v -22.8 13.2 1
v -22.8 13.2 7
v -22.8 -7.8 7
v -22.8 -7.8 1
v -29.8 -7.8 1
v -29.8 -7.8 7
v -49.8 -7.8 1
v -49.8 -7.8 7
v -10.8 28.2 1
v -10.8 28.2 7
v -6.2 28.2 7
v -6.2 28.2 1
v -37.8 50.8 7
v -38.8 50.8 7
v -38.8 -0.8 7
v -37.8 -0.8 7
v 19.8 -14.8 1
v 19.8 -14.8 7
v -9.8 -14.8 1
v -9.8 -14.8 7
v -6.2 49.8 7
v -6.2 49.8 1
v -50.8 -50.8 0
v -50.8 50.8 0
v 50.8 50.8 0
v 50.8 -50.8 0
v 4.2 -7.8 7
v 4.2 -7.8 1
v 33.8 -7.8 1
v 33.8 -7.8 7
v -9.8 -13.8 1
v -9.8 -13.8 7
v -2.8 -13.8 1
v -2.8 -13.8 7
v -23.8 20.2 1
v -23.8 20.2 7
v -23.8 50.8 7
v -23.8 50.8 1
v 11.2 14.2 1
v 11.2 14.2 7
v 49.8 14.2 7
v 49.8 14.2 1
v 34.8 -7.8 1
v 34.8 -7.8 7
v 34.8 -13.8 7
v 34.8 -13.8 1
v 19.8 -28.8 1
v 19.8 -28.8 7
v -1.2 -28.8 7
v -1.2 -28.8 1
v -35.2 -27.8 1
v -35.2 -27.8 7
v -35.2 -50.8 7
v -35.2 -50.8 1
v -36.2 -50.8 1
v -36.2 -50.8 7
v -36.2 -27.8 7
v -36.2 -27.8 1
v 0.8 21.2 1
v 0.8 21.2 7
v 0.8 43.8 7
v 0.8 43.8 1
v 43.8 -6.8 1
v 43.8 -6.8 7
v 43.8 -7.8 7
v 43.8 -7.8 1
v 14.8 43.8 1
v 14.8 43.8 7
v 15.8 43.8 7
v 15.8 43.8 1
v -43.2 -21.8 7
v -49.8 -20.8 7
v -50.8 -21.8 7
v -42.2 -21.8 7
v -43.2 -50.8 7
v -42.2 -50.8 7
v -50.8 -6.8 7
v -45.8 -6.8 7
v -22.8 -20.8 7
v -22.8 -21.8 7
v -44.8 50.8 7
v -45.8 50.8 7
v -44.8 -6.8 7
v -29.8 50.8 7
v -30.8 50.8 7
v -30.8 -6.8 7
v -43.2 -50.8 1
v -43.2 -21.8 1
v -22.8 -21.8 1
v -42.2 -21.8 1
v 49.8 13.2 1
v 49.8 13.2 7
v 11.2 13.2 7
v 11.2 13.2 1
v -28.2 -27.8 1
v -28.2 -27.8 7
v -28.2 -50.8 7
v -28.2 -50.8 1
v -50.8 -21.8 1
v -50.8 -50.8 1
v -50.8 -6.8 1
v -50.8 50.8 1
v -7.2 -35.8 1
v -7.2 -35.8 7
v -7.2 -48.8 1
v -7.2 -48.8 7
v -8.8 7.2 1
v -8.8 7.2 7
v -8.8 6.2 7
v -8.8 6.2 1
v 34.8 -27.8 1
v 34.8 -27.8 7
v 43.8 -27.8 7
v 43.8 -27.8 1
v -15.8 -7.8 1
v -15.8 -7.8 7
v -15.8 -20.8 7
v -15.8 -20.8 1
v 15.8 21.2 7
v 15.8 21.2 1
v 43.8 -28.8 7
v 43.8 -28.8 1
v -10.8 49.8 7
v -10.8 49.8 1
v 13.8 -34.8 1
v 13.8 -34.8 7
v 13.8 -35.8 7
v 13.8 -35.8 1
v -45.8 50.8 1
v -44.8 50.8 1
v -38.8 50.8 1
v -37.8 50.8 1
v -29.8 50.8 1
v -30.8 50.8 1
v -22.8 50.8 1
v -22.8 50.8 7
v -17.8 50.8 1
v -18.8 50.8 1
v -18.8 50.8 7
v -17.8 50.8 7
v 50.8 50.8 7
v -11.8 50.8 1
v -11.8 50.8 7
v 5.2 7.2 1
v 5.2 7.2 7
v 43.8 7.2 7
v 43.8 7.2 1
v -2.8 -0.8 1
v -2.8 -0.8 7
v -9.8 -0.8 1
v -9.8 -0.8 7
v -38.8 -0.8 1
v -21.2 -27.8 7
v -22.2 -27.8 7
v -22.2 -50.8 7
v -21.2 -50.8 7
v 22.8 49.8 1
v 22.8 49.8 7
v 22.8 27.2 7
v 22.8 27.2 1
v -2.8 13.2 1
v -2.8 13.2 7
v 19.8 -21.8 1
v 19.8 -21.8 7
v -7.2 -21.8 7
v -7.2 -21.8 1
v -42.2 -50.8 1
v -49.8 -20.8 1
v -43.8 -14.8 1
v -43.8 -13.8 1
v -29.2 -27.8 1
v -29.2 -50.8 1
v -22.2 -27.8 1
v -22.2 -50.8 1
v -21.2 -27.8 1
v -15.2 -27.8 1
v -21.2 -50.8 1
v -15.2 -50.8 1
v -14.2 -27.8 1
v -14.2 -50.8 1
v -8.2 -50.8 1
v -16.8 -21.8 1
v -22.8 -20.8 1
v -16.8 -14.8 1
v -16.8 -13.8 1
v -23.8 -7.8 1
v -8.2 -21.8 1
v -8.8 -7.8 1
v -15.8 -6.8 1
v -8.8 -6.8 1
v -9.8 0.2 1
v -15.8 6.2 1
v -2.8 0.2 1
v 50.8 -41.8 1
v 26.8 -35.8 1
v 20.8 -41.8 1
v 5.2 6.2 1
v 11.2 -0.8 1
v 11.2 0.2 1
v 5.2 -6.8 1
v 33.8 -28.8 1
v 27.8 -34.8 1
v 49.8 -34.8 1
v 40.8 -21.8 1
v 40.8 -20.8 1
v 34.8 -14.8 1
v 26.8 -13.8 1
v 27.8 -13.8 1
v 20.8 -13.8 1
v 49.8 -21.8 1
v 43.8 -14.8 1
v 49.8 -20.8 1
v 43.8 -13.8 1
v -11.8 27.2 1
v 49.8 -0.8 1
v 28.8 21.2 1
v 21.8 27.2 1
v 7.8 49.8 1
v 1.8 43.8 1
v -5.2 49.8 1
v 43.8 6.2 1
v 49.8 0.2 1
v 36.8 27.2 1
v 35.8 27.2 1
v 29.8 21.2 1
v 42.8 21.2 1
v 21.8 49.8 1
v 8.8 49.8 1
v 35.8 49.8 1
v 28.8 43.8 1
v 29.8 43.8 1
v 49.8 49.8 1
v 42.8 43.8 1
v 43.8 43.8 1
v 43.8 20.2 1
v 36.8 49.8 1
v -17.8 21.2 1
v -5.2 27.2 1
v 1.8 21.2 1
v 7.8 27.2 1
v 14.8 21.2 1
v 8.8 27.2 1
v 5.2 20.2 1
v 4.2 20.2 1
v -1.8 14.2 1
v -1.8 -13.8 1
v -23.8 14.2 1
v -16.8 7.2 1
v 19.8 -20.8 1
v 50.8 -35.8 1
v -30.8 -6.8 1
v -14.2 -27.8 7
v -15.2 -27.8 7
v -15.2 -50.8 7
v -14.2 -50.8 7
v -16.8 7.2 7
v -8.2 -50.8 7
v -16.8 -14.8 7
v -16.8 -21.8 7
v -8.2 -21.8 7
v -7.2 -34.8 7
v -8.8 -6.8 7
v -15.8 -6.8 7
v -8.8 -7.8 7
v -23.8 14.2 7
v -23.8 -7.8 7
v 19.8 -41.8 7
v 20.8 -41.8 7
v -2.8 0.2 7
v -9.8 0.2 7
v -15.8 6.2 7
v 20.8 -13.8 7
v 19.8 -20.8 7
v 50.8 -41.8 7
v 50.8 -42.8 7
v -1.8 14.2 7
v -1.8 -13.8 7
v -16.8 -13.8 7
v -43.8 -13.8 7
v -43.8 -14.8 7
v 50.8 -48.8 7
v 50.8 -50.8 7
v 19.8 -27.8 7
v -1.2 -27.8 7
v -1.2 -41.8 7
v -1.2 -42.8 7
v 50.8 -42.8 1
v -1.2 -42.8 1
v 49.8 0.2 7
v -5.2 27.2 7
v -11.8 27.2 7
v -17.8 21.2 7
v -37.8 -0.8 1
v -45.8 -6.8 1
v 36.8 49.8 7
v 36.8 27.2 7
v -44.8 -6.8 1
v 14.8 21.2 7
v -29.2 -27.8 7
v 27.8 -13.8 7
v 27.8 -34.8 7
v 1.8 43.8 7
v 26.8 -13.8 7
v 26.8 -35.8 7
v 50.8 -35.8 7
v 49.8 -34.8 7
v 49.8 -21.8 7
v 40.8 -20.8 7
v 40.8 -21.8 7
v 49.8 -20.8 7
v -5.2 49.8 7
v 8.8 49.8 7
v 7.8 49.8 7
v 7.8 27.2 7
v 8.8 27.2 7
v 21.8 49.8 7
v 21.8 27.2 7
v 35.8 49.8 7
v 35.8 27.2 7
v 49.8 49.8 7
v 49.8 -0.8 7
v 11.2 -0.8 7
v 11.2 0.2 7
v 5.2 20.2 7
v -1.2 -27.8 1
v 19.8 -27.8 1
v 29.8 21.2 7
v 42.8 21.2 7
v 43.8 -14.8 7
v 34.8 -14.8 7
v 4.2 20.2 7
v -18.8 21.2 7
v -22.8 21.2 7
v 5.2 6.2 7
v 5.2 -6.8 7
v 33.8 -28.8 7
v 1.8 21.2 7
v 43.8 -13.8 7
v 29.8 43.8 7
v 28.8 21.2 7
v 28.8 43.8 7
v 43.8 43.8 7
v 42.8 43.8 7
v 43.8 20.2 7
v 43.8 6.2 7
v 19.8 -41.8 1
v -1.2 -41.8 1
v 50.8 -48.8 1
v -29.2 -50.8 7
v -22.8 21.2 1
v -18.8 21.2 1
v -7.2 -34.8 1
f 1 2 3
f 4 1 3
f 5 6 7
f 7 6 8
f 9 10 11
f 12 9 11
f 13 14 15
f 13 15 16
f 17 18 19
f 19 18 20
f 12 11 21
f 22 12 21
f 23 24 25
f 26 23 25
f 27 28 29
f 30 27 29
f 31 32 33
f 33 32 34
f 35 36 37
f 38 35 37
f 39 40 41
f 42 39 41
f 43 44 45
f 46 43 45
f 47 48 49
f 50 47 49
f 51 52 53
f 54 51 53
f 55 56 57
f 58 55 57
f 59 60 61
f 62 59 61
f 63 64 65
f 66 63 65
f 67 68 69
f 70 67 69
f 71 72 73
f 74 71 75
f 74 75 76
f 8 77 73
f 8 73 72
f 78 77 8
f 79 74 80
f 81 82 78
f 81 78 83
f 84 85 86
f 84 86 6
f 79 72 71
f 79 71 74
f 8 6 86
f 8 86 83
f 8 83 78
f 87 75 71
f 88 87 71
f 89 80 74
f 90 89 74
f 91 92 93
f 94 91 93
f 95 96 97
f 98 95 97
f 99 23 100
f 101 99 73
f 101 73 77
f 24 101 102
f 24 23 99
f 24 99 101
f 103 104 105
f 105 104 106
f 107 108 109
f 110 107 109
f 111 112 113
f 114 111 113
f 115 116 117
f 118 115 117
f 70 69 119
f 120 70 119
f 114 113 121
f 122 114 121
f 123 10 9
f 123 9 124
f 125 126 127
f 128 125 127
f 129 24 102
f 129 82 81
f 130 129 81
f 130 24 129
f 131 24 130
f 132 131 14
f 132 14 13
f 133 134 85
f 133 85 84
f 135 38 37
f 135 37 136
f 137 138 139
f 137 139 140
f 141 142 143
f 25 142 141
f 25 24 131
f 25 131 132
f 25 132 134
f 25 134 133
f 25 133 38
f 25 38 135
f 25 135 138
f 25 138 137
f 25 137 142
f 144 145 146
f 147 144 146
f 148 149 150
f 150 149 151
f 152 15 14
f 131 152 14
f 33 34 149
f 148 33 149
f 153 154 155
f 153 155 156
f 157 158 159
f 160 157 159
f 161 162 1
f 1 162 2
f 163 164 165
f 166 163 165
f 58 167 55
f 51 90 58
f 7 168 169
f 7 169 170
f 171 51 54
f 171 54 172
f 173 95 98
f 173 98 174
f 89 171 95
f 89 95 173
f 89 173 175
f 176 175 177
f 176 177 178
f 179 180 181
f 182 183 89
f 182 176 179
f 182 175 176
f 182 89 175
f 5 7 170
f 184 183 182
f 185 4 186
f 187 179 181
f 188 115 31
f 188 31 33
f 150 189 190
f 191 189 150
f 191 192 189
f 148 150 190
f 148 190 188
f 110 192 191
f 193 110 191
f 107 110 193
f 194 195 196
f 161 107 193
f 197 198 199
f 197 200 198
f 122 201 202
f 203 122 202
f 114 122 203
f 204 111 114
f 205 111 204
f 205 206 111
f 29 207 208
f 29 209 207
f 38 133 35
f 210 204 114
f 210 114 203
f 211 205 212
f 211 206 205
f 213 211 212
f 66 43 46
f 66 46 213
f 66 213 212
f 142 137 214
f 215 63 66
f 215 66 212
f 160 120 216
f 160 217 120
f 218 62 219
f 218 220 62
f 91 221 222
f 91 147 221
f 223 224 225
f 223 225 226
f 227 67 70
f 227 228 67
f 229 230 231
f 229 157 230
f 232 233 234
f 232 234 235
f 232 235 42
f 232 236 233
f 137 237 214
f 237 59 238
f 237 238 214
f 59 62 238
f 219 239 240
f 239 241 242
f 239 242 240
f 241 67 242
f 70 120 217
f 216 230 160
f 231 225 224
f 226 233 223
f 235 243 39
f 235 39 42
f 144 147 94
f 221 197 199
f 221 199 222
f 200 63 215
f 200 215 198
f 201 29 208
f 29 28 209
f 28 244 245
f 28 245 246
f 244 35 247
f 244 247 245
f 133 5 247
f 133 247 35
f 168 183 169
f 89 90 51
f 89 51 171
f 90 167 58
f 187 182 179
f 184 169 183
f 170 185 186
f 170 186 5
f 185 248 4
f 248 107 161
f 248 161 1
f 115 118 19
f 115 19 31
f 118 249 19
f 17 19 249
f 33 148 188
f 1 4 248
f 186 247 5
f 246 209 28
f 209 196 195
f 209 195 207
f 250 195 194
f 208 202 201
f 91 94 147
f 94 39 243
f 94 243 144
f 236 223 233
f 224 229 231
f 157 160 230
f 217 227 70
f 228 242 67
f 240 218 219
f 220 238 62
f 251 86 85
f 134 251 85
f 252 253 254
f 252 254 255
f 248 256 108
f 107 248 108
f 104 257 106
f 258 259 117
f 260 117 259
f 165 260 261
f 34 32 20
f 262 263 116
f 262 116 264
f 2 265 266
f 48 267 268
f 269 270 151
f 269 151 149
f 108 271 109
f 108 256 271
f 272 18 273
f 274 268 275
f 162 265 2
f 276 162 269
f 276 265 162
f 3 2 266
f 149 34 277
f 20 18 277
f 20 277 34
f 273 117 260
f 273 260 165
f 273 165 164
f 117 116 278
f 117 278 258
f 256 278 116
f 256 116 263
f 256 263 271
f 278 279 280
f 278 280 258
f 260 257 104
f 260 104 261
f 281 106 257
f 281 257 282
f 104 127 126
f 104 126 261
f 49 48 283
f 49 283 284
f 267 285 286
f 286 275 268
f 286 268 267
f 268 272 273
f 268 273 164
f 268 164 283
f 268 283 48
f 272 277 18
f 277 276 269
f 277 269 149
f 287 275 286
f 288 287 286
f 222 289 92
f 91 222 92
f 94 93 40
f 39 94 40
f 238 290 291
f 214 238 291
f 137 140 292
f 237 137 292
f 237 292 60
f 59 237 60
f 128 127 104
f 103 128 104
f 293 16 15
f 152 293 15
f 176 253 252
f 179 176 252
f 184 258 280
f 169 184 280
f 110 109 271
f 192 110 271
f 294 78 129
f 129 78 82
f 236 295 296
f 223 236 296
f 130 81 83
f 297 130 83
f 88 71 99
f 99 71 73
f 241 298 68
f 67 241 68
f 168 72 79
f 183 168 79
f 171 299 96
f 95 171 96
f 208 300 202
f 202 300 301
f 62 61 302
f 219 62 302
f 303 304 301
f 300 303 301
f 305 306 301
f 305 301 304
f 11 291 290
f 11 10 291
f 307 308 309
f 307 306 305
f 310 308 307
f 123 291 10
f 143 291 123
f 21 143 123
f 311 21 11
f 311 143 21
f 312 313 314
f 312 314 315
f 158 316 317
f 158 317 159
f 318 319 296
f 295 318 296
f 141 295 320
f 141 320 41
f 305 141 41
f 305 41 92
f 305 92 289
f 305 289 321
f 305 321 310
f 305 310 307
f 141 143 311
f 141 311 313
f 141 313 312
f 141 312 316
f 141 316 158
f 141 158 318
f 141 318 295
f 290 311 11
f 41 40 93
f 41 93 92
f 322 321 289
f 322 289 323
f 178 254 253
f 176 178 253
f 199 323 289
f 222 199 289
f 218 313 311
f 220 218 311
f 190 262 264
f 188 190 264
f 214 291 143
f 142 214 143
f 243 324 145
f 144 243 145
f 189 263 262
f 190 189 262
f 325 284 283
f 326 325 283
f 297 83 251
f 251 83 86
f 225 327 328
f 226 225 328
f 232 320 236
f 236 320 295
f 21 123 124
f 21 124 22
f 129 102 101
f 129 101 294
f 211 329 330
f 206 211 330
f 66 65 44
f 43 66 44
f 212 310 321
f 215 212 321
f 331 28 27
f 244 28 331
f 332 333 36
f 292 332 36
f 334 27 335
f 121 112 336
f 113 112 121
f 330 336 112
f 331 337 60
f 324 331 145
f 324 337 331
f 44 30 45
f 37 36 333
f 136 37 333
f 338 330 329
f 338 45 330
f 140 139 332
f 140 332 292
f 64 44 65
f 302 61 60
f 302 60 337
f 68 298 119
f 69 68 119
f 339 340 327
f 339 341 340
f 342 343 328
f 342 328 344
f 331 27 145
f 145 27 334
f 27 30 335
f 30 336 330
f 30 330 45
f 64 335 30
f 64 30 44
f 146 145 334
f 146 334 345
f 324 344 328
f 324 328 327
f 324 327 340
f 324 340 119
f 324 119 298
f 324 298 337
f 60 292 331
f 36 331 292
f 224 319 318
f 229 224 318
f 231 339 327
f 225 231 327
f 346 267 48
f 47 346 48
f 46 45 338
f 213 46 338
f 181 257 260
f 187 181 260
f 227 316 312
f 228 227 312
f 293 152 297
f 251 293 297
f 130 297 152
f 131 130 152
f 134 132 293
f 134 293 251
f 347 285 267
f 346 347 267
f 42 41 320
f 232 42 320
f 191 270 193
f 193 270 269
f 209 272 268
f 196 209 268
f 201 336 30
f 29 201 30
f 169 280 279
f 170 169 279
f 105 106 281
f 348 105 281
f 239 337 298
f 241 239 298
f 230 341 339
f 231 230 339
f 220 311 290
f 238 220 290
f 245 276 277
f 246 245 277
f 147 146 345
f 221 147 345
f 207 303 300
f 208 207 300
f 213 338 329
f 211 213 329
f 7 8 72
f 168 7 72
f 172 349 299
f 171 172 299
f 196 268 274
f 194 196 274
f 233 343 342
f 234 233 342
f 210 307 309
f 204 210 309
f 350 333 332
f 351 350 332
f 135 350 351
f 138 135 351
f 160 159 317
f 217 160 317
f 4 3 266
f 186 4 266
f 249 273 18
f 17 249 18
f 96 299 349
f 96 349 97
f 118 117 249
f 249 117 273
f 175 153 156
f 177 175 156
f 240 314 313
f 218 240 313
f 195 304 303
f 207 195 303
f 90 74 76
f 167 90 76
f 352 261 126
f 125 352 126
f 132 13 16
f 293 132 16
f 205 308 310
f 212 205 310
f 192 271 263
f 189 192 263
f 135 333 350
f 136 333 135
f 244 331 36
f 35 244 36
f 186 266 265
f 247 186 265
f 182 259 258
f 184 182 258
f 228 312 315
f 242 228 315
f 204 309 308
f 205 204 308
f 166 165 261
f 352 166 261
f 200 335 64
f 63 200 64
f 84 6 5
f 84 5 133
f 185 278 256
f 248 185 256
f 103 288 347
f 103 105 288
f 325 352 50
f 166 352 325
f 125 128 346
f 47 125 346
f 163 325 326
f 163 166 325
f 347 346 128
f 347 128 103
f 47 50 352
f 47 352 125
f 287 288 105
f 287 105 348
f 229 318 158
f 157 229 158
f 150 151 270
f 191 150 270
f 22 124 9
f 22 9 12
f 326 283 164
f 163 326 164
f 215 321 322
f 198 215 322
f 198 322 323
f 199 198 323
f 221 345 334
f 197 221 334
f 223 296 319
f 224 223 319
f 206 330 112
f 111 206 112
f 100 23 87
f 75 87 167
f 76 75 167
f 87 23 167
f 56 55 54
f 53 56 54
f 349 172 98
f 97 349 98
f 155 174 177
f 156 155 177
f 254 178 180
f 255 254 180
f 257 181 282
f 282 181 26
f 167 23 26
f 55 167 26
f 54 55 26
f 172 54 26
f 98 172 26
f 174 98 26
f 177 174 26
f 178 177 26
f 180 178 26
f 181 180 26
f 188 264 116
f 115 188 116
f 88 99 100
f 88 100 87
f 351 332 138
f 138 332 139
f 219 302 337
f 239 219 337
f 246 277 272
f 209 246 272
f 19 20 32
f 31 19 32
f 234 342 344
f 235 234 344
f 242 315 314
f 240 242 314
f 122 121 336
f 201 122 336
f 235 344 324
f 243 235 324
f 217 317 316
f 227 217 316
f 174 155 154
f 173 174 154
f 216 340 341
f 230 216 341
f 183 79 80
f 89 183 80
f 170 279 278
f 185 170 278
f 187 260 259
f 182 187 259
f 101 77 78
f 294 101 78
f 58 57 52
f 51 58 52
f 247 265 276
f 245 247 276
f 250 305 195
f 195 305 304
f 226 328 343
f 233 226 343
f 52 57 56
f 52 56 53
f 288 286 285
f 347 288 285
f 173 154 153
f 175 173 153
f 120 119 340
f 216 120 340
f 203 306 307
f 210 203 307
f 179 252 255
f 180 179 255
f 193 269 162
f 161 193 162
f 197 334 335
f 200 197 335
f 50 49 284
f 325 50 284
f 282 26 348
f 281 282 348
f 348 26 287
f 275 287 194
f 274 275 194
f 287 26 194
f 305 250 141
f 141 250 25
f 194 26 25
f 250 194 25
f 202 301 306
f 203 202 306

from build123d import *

# Parameters (mm, degrees)
F0_W      = 101.6
F0_H      = 101.6
F1_DEPTH  = 7
F3_DEPTH  = 6
F4_W      = 5
F4_H      = 57.6000098
F5_DEPTH  = 6
F6_W      = 6
F6_H      = 29.5999916
F6_W_2    = 4
F6_W_3    = 4.6
F6_H_2    = 21.5999916
F7_DEPTH  = 6
F9_DEPTH  = 6
F11_DEPTH = 6
F12_W     = 22.6
F12_H     = 1
F13_DEPTH = 6
F15_DEPTH = 6


with BuildPart() as f1:
    # F0 (on Top) → F1 (new body)
    with BuildSketch(Plane.XY):
        Rectangle(F0_W, F0_H)
    extrude(amount=F1_DEPTH)

    # F2 (on face) → F3 (cut)
    with BuildSketch(Plane.XY.offset(7)):
        Polygon((-1.2, -42.8), (-1.2, -41.8), (19.8, -41.8), (19.8, -28.8), (-1.2, -28.8), (-1.2, -27.8), (19.8, -27.8), (19.8, -21.8), (-7.2, -21.8), (-7.2, -34.8), (13.8, -34.8), (13.8, -35.8), (-7.2, -35.8), (-7.2, -48.8), (50.8, -48.8), (50.8, -42.8), align=None)
    extrude(amount=-F3_DEPTH, mode=Mode.SUBTRACT)

    # F4 (on face) → F5 (cut)
    with BuildSketch(Plane.XY.offset(7)):
        with Locations((-48.3, 21.9999951)):
            Rectangle(F4_W, F4_H)
        Polygon((-44.8, 50.8), (-44.8, -6.8000098), (-30.8, -6.8000098), (-30.8, 50.8), (-37.8, 50.8), (-37.8, -0.8000098), (-38.8, -0.8000098), (-38.8, 50.8), align=None)
    extrude(amount=-F5_DEPTH, mode=Mode.SUBTRACT)

    # F6 (on face) → F7 (cut)
    with BuildSketch(Plane.XY.offset(7)):
        with Locations((-26.8, 36.0000042)):
            Rectangle(F6_W, F6_H)
        with Locations((-20.8, 36.0000042)):
            Rectangle(F6_W_2, F6_H)
        Polygon((-17.8, 50.8), (-17.8, 21.2000084), (0.8, 21.2000084), (0.8, 43.8), (1.8, 43.8), (1.8, 21.2000084), (14.8, 21.2000084), (14.8, 43.8), (15.8, 43.8), (15.8, 21.2000084), (28.8, 21.2000084), (28.8, 43.8), (29.8, 43.8), (29.8, 21.2000084), (42.8, 21.2000084), (42.8, 43.8), (43.8, 43.8), (43.8, 21.2000084), (49.8, 21.2000084), (49.8, 49.8), (36.8, 49.8), (36.8, 27.2000084), (35.8, 27.2000084), (35.8, 49.8), (22.8, 49.8), (22.8, 27.2000084), (21.8, 27.2000084), (21.8, 49.8), (8.8, 49.8), (8.8, 27.2000084), (7.8, 27.2000084), (7.8, 49.8), (-5.2, 49.8), (-5.2, 28.2000084), (-5.2, 27.2000084), (-6.2, 27.2000084), (-10.8, 27.2000084), (-11.8, 27.2000084), (-11.8, 28.2000084), (-11.8, 49.8), (-11.8, 50.8), align=None)
        with Locations((-8.5, 39.0000042)):
            Rectangle(F6_W_3, F6_H_2)
    extrude(amount=-F7_DEPTH, mode=Mode.SUBTRACT)

    # F8 (on face) → F9 (cut)
    with BuildSketch(Plane.XY.offset(7)):
        Polygon((-29.8, 21.2000084), (-29.8, 14.2000084), (-1.8, 14.2000084), (-1.8, -13.8), (19.8, -13.8), (20.8, -13.8), (20.8, -41.8), (50.8, -41.8), (50.8, -35.8), (26.8, -35.8), (26.8, -34.8), (26.8, -6.8), (4.2, -6.8), (4.2, 20.2000084), (-22.8, 20.2000084), (-23.8, 20.2000084), (-23.8, 21.2000084), align=None)
    extrude(amount=-F9_DEPTH, mode=Mode.SUBTRACT)

    # F10 (on face) → F11 (cut)
    with BuildSketch(Plane.XY.offset(7)):
        Polygon((49.8, 21.2000084), (43.8, 21.2000084), (43.8, 20.2000084), (5.2, 20.2000084), (5.2, 7.2000084), (43.8, 7.2000084), (43.8, 6.2000084), (5.2, 6.2000084), (5.2, -5.8), (5.2, -6.8), (26.8, -6.8), (43.8, -6.8), (43.8, -7.8), (34.8, -7.8), (34.8, -13.8), (43.8, -13.8), (43.8, -14.8), (34.8, -14.8), (34.8, -27.8), (43.8, -27.8), (43.8, -28.8), (34.8, -28.8), (33.8, -28.8), (33.8, -7.8), (26.8, -7.8), (26.8, -13.8), (27.8, -13.8), (27.8, -34.8), (49.8, -34.8), (49.8, -21.8), (40.8, -21.8), (40.8, -20.8), (49.8, -20.8), (49.8, -7.8), (49.8, -6.8), (49.8, -0.7999916), (11.2, -0.7999916), (11.2, 0.2000084), (49.8, 0.2000084), (49.8, 13.2000084), (11.2, 13.2000084), (11.2, 14.2000084), (49.8, 14.2000084), align=None)
    extrude(amount=-F11_DEPTH, mode=Mode.SUBTRACT)

    # F12 (on face) → F13 (join)
    with BuildSketch(Plane.XY.offset(1)):
        with Locations((15.5, -7.3)):
            Rectangle(F12_W, F12_H)
    extrude(amount=F13_DEPTH)

    # F14 (on face) → F15 (cut)
    with BuildSketch(Plane.XY.offset(7)):
        Polygon((-29.8, -6.8000098), (-29.8, -7.8000098), (-49.8, -7.8000098), (-49.8, -20.8000098), (-22.8, -20.8000098), (-22.8, -21.8), (-42.2, -21.8), (-42.2, -27.8), (-42.2, -50.8), (-36.2, -50.8), (-36.2, -27.8), (-35.2, -27.8), (-35.2, -50.8), (-29.2, -50.8), (-29.2, -27.8), (-28.2, -27.8), (-28.2, -50.8), (-22.2, -50.8), (-22.2, -27.8), (-21.2, -27.8), (-21.2, -50.8), (-15.2, -50.8), (-15.2, -27.8), (-14.2, -27.8), (-14.2, -50.8), (-8.2, -50.8), (-8.2, -21.8), (-16.8, -21.8), (-16.8, -20.8000098), (-16.8, -14.8000098), (-43.8, -14.8000098), (-43.8, -13.8000098), (-16.8, -13.8000098), (-16.8, 7.2000084), (-15.8, 7.2000084), (-8.8, 7.2000084), (-8.8, 6.2000084), (-15.8, 6.2000084), (-15.8, -6.7999916), (-8.8, -6.7999916), (-8.8, -7.7999916), (-15.8, -7.7999916), (-15.8, -14.8000098), (-15.8, -20.8000098), (19.8, -20.8000098), (19.8, -14.8), (-2.8, -14.8), (-9.8, -14.8), (-9.8, -13.8), (-2.8, -13.8), (-2.8, -0.7999916), (-9.8, -0.7999916), (-9.8, 0.2000084), (-2.8, 0.2000084), (-2.8, 13.2000084), (-22.8, 13.2000084), (-22.8, -7.8000098), (-23.8, -7.8000098), (-23.8, 14.2000084), (-29.8, 14.2000084), align=None)
        Polygon((-43.2, -21.8), (-50.8, -21.8), (-50.8, -50.8), (-43.2, -50.8), (-43.2, -27.8), align=None)
    extrude(amount=-F15_DEPTH, mode=Mode.SUBTRACT)


solid = f1.part
